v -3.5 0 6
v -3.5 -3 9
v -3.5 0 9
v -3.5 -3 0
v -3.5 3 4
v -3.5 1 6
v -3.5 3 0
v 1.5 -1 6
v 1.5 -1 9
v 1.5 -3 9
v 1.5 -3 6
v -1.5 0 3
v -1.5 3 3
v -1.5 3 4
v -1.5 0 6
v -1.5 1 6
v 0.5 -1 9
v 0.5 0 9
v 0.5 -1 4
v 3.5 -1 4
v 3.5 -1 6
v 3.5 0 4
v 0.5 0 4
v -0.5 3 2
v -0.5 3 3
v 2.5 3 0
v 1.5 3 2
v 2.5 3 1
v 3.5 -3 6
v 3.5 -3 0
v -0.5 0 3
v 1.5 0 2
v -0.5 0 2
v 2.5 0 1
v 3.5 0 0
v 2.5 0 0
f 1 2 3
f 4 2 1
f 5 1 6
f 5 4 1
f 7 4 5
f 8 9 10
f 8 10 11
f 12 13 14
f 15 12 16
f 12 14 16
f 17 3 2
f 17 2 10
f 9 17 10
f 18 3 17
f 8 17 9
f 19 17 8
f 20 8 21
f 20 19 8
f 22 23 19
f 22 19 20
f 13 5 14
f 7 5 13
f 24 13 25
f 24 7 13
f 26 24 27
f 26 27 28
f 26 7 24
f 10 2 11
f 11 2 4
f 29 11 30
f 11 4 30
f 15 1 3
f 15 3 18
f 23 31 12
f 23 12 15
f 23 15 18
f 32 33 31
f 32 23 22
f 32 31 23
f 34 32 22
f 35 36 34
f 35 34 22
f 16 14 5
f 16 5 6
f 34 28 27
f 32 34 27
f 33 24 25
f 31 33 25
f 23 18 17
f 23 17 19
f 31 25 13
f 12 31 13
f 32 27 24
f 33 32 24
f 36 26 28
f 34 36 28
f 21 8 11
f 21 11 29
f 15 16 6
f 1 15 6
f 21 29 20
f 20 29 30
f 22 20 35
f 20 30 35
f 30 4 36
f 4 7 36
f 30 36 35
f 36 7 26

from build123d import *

# Parameters (mm, degrees)
SKETCH1_W           = 7
SKETCH1_H           = 6
BOSS_EXTRUDE1_DEPTH = 9
SKETCH2_OUTSIDE_W   = 11.576
SKETCH2_OUTSIDE_H   = 13.576
CUT_EXTRUDE1_DEPTH  = 3
SKETCH3_W           = 3
SKETCH3_H           = 5
CUT_EXTRUDE2_DEPTH  = 1
SKETCH4_W           = 2
SKETCH4_H           = 3
CUT_EXTRUDE3_DEPTH  = 2
CUT_EXTRUDE4_DEPTH  = 2


with BuildPart() as part:
    # Sketch1 → Boss-Extrude1 (new body)
    with BuildSketch(Plane.XY):
        Rectangle(SKETCH1_W, SKETCH1_H)
    extrude(amount=BOSS_EXTRUDE1_DEPTH)

    # Sketch2 outside → Cut-Extrude1 (cut)
    with BuildSketch(Plane(origin=(0, 3, 0), x_dir=(1, 0, 0), z_dir=(0, 1, 0))):
        with Locations((0, -4.5)):
            Rectangle(SKETCH2_OUTSIDE_W, SKETCH2_OUTSIDE_H)
        Polygon((2.5, 0), (2.5, -1), (1.5, -2), (-0.5, -2), (-0.5, -3), (-1.5, -3), (-1.5, -6), (-3.5, -6), (-3.5, 0), align=None, mode=Mode.SUBTRACT)
    extrude(amount=-CUT_EXTRUDE1_DEPTH, mode=Mode.SUBTRACT)

    # Sketch3 → Cut-Extrude2 (cut)
    with BuildSketch(Plane(origin=(0, 0, 0), x_dir=(1, 0, 0), z_dir=(0, 1, 0))):
        with Locations((2, -6.5)):
            Rectangle(SKETCH3_W, SKETCH3_H)
    extrude(amount=-CUT_EXTRUDE2_DEPTH, mode=Mode.SUBTRACT)

    # Sketch4 → Cut-Extrude3 (cut)
    with BuildSketch(Plane(origin=(0, -1, 0), x_dir=(1, 0, 0), z_dir=(0, 1, 0))):
        with Locations((2.5, -7.5)):
            Rectangle(SKETCH4_W, SKETCH4_H)
    extrude(amount=-CUT_EXTRUDE3_DEPTH, mode=Mode.SUBTRACT)

    # Sketch5 → Cut-Extrude4 (cut)
    with BuildSketch(Plane(origin=(-1.5, 0, 0), x_dir=(0, 0, -1), z_dir=(1, 0, 0))):
        Polygon((-4, 3), (-6, 1), (-6, 3), align=None)
    extrude(amount=-CUT_EXTRUDE4_DEPTH, mode=Mode.SUBTRACT)


solid = part.part
